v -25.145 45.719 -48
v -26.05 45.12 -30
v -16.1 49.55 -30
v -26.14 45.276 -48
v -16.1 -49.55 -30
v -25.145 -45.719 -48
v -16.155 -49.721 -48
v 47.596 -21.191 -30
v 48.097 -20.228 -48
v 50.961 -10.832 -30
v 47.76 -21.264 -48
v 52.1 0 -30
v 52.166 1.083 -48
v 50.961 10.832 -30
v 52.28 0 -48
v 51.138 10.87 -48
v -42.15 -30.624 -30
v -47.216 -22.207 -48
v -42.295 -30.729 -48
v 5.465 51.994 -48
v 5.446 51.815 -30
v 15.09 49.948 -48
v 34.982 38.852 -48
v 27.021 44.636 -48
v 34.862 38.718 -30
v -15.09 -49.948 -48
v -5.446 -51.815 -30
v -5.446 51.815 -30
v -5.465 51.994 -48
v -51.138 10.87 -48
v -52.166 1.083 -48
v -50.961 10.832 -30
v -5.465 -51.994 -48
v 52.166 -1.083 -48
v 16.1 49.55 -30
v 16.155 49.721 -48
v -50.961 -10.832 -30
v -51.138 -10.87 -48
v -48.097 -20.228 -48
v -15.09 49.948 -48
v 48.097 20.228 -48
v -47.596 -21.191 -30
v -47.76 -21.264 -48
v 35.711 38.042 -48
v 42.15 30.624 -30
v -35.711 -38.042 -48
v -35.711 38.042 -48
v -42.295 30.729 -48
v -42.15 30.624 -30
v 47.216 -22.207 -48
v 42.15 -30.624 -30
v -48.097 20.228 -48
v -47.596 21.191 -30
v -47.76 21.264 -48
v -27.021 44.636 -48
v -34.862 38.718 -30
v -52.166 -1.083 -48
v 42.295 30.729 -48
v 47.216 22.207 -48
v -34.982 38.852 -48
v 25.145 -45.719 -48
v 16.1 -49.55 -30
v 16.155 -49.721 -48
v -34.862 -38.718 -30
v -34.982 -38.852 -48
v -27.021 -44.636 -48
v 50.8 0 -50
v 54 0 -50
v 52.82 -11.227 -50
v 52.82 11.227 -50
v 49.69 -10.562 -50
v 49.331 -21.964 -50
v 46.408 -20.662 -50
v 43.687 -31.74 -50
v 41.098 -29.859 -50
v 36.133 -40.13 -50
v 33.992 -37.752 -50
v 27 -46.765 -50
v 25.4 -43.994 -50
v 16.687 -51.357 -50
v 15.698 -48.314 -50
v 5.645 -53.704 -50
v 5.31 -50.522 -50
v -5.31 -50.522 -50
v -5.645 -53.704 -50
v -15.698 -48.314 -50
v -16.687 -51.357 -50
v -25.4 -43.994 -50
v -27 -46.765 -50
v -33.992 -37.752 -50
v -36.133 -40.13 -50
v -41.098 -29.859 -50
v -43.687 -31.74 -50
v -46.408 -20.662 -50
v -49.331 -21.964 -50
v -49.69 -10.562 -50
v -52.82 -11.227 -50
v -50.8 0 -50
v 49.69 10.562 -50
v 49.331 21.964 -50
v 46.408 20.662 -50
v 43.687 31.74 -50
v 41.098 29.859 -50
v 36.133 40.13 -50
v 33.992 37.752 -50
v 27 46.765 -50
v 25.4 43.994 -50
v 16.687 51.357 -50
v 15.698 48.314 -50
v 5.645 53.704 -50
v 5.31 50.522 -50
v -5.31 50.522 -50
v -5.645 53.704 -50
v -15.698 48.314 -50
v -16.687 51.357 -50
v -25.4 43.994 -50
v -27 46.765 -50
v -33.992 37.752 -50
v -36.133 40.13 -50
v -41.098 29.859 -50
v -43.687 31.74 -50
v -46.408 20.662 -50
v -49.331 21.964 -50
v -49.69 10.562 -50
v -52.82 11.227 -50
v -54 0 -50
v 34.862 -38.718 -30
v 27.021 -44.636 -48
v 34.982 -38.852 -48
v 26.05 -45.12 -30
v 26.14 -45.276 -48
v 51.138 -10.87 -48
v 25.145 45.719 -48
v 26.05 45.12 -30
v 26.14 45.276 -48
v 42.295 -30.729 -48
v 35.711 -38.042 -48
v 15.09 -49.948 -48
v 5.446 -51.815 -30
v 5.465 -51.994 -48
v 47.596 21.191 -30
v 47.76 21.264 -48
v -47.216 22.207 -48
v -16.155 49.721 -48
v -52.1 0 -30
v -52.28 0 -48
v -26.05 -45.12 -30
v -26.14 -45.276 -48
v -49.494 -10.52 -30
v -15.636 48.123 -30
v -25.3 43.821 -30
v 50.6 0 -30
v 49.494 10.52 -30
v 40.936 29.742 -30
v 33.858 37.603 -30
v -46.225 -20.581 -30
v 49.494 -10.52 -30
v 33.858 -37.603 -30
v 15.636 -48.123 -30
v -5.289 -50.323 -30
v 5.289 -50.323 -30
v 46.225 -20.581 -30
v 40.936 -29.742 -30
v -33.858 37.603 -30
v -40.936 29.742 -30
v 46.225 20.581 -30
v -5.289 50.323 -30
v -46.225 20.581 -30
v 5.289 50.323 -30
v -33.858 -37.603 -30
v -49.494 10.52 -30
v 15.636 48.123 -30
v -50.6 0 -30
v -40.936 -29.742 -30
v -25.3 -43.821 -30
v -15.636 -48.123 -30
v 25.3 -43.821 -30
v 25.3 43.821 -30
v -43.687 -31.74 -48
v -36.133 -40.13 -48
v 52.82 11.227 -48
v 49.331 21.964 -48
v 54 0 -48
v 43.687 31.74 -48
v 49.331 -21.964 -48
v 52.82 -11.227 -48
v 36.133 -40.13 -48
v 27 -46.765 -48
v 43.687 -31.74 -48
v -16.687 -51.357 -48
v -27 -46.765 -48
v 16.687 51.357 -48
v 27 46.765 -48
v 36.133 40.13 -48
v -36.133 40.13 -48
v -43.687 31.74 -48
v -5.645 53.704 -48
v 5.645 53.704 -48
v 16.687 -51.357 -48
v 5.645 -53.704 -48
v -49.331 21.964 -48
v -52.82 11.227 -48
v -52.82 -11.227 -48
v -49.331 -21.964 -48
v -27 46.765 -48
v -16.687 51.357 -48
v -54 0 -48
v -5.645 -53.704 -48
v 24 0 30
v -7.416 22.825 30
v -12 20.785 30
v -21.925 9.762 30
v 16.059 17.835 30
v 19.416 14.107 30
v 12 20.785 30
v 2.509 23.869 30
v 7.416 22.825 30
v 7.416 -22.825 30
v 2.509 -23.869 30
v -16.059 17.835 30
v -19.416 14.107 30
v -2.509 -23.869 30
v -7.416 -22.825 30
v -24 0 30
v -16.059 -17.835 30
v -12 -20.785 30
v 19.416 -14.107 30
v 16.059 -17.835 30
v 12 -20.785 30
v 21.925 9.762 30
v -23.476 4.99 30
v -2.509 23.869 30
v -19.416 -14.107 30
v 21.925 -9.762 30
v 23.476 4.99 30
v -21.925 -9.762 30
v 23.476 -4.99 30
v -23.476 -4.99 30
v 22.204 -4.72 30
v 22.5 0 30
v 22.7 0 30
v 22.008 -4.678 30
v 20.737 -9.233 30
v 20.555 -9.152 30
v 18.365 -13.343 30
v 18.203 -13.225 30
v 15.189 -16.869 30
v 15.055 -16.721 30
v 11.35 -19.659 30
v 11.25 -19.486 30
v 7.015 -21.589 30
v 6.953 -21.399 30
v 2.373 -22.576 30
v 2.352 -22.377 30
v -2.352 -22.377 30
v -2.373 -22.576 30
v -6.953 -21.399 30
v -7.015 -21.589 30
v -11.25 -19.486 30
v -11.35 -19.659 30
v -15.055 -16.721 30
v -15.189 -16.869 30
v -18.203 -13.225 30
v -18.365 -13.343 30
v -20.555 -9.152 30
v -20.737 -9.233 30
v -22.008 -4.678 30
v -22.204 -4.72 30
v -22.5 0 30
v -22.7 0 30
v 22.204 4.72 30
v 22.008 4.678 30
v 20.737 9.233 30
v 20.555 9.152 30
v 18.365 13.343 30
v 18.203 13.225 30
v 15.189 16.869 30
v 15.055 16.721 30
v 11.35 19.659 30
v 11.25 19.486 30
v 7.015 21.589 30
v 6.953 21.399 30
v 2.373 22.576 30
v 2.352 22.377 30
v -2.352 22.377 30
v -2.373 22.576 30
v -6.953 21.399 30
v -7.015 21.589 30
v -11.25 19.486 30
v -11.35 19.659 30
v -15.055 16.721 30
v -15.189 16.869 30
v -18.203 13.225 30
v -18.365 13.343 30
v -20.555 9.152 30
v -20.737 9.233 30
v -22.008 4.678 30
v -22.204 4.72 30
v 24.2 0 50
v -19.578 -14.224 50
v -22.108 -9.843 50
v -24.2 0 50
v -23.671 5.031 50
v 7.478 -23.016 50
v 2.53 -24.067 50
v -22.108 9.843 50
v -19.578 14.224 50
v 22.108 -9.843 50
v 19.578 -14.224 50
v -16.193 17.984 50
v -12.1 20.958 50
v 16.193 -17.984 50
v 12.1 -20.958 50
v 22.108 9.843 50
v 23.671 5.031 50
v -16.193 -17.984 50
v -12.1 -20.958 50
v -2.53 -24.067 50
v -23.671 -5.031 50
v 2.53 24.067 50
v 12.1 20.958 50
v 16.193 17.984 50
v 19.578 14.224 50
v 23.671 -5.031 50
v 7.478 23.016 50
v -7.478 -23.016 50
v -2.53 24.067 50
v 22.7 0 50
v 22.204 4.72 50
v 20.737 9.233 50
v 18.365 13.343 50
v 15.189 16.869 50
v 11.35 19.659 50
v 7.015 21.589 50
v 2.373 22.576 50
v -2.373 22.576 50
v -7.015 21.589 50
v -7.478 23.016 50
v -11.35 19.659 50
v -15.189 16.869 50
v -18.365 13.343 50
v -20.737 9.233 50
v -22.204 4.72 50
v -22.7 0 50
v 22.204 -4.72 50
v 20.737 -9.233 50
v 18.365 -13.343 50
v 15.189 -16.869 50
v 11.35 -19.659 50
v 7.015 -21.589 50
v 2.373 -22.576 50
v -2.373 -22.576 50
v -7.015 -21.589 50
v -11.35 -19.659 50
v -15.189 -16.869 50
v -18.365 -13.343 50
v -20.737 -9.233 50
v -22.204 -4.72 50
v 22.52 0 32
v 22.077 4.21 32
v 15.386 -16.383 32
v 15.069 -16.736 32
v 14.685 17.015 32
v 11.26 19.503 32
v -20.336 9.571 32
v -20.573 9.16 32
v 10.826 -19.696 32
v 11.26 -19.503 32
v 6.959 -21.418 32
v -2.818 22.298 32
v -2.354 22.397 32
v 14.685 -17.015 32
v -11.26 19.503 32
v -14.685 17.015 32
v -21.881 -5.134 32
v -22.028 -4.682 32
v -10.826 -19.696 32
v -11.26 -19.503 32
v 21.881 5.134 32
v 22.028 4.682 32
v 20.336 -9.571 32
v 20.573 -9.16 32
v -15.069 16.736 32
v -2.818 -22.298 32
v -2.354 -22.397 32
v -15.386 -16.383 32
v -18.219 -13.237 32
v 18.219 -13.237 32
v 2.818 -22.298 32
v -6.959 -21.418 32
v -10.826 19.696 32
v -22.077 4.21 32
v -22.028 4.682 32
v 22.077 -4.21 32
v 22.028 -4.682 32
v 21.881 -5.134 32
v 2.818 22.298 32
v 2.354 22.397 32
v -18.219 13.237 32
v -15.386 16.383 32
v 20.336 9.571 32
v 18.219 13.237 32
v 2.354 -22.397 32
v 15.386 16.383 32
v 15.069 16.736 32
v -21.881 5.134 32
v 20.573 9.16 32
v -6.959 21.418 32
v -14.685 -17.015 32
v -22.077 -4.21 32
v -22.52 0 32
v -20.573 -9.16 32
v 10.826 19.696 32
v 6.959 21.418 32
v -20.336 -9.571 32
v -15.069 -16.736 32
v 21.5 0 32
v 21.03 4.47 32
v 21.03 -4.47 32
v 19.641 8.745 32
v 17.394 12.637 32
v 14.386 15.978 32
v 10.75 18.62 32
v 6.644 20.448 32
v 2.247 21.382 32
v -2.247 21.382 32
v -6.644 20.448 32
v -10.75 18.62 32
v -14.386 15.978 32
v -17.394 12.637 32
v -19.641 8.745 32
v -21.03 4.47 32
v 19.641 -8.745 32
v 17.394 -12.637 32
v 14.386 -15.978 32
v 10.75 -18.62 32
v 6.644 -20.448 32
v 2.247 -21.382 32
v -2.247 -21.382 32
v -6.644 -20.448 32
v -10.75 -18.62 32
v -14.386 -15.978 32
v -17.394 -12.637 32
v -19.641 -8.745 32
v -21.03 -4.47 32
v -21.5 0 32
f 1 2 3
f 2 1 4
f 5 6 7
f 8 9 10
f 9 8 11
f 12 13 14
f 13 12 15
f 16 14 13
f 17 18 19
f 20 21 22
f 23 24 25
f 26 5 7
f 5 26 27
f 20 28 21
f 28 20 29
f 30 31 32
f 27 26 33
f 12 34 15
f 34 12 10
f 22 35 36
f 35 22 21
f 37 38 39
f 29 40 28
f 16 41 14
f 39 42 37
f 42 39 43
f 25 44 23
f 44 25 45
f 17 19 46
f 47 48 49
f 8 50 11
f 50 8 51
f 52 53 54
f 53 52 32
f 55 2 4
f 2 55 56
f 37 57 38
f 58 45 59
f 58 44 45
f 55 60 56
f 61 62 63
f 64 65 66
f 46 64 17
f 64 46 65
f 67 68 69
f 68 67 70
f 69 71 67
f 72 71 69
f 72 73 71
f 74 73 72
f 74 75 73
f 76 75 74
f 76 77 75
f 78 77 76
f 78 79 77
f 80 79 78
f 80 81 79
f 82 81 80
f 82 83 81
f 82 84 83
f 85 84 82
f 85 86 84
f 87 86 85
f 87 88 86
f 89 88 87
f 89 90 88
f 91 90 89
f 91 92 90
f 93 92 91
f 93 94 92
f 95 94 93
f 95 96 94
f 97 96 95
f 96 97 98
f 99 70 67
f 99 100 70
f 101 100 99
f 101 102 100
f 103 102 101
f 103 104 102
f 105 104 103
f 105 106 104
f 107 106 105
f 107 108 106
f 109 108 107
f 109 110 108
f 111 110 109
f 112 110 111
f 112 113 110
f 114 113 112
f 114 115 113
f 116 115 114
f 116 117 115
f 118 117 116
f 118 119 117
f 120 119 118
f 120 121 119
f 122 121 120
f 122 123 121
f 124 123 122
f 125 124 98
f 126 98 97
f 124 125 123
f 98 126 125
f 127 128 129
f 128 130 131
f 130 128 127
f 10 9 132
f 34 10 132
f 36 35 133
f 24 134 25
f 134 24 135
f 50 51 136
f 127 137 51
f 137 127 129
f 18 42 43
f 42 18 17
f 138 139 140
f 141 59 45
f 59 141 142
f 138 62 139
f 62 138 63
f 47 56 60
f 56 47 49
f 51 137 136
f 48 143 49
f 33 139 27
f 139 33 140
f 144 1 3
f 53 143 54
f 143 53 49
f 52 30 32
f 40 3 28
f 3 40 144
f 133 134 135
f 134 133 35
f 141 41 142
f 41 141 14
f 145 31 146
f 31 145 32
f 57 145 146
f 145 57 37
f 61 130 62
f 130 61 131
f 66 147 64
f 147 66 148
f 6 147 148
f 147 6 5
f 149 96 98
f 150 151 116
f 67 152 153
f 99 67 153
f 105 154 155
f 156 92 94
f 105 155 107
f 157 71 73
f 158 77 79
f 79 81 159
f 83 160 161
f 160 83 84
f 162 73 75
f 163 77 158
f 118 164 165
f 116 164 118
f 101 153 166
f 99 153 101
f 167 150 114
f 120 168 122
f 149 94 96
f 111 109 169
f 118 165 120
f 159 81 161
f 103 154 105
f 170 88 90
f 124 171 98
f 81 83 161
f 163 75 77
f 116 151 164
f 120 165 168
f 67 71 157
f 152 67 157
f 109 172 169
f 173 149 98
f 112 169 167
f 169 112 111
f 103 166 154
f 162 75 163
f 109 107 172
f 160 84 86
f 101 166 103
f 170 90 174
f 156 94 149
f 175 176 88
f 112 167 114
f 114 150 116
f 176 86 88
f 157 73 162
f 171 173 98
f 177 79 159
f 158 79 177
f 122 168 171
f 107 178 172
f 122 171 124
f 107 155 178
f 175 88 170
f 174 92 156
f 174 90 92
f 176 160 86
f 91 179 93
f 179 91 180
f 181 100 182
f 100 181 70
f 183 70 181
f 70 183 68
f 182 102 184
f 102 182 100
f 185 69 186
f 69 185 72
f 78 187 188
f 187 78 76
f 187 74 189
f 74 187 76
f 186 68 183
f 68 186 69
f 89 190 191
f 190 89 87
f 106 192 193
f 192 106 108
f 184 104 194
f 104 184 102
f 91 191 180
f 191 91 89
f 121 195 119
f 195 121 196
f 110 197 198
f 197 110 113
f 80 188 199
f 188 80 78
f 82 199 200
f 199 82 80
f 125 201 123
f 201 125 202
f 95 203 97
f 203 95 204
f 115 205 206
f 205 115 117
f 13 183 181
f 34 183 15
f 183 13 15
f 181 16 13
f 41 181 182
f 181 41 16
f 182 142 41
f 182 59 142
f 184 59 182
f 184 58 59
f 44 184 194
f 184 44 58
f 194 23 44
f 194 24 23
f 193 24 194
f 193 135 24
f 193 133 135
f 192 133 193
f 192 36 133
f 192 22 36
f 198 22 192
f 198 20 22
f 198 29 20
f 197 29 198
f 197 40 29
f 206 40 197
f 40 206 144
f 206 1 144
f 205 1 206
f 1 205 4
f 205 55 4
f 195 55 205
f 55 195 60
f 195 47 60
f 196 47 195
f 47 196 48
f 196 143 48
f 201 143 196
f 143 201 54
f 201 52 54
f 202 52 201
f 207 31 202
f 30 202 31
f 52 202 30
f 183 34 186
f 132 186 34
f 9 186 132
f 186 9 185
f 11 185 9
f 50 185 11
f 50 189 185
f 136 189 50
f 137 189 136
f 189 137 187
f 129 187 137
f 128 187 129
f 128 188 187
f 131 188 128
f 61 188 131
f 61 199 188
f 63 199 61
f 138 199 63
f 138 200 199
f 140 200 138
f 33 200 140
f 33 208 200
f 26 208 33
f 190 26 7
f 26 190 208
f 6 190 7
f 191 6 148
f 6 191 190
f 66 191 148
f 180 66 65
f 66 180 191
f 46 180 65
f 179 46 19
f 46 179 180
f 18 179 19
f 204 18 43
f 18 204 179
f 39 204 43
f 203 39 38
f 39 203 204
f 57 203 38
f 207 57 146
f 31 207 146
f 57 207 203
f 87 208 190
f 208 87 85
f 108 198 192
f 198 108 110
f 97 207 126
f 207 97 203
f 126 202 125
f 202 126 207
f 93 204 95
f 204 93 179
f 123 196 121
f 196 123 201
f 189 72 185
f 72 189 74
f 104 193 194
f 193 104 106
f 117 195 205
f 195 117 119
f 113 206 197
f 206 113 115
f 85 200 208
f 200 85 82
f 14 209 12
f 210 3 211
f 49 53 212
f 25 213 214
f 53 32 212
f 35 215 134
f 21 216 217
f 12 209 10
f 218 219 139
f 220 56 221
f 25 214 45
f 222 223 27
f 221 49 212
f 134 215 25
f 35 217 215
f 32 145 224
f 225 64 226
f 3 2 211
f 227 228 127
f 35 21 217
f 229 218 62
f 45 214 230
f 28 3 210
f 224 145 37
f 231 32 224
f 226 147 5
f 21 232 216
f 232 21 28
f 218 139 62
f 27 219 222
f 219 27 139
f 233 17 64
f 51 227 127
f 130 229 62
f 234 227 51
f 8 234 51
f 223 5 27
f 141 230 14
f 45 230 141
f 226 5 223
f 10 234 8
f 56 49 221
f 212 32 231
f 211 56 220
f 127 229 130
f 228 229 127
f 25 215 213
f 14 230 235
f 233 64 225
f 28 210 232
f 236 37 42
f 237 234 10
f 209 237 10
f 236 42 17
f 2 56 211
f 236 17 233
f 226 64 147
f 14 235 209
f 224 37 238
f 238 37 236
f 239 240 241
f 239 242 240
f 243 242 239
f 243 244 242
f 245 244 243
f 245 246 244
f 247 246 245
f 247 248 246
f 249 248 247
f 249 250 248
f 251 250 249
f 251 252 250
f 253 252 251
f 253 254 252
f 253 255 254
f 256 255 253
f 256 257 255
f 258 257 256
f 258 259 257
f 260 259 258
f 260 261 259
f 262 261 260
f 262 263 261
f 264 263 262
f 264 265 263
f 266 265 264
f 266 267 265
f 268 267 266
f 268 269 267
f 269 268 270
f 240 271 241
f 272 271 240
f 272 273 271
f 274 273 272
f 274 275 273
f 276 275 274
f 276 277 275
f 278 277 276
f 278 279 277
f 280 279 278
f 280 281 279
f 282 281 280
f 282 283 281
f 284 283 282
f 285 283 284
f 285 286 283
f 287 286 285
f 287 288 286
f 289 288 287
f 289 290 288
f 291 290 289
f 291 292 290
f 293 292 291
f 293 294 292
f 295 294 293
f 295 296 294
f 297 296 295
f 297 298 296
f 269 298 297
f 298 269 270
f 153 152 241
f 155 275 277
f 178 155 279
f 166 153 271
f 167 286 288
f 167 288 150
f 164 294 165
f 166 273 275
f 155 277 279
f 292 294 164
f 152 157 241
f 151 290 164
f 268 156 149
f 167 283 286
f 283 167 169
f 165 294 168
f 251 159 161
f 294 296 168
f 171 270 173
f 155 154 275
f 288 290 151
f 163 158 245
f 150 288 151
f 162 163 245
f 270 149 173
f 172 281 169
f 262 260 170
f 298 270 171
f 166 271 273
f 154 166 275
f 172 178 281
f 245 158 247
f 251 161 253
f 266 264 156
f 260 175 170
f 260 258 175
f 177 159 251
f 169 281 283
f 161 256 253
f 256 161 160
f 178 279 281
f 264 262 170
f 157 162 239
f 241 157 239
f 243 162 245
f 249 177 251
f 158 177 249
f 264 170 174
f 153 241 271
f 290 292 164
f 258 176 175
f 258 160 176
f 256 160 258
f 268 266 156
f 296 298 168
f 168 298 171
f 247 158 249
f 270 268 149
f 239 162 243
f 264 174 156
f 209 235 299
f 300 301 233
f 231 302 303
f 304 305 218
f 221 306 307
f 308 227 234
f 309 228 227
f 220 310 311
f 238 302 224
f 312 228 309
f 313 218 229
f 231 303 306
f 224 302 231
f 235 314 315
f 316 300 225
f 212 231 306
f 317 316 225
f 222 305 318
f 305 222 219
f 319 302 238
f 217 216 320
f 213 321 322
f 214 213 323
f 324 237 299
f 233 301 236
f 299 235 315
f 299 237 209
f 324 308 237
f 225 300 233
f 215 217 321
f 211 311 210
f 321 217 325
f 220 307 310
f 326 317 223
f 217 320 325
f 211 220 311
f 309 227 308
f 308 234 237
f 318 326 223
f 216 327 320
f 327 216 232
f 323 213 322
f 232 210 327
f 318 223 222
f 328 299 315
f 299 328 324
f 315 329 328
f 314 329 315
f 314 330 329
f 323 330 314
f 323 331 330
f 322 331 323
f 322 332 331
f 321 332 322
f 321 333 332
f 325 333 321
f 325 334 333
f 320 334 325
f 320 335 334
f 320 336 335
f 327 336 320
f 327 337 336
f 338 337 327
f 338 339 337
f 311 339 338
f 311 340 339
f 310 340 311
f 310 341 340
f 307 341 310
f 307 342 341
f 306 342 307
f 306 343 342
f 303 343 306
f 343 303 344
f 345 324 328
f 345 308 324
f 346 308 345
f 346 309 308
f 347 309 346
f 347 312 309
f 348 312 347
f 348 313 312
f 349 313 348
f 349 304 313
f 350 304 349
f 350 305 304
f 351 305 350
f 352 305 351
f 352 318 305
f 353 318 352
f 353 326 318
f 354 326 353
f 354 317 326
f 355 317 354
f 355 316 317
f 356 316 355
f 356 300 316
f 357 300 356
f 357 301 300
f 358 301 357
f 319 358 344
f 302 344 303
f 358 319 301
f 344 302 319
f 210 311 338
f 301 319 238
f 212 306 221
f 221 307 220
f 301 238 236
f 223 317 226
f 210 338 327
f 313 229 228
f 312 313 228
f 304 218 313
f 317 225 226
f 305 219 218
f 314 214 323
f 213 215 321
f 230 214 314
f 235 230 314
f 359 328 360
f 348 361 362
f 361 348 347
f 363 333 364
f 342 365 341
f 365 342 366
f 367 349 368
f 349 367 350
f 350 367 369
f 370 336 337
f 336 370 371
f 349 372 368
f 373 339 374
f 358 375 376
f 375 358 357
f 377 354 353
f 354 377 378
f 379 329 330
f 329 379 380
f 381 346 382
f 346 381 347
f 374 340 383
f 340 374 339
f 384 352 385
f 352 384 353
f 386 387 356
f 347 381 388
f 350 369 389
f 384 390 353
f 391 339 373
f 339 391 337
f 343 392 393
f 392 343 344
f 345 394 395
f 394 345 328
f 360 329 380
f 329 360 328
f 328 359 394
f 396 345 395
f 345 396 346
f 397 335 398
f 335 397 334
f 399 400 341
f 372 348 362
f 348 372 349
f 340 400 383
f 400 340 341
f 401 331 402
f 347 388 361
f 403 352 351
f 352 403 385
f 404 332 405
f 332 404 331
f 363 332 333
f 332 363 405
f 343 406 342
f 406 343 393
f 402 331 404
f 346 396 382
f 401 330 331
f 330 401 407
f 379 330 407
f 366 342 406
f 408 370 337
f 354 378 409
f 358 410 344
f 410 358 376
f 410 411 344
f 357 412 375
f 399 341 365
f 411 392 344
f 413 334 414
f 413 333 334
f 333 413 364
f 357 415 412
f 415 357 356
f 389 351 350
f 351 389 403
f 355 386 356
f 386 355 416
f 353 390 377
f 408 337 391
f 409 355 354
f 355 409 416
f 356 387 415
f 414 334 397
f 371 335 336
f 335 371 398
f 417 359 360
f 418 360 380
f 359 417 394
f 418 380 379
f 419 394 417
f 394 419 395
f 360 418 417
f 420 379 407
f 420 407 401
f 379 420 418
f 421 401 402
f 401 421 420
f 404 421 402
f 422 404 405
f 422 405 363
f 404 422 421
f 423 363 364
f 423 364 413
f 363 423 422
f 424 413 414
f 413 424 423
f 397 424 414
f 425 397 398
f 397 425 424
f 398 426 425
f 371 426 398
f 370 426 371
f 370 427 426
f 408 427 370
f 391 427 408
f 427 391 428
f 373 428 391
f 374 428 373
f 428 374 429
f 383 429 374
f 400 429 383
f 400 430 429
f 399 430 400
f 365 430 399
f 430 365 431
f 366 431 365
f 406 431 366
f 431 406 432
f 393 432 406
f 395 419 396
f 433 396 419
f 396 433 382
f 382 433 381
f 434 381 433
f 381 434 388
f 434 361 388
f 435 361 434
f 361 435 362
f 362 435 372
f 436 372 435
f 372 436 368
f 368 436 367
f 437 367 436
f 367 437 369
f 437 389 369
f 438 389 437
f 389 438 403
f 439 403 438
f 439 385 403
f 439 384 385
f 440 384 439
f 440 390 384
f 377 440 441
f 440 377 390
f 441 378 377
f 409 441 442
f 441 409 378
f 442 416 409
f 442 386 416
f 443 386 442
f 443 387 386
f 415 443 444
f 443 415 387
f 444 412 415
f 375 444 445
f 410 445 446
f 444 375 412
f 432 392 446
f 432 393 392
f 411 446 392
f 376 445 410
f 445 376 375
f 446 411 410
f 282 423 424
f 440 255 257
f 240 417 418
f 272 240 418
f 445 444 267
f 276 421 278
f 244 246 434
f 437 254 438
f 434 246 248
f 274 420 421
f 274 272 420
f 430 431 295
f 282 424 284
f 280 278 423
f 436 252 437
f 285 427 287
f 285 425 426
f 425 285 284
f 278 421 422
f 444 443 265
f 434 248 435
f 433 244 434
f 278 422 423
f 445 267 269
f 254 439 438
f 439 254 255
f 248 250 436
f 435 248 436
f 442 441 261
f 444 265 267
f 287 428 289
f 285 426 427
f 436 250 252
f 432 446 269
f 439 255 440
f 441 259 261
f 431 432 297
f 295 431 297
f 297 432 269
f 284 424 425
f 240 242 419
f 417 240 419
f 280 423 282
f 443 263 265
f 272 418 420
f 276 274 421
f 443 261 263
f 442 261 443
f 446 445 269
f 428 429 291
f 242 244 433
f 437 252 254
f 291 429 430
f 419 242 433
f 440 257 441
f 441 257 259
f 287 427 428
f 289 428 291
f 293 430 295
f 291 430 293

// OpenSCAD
translate([0,0,-40]) {
    difference() {
        cylinder(h = 20, r1 = 52.3, r2 = 52.1, center = true);
        cylinder(h = 20, r1 = 50.8, r2 = 50.6, center = true);
    };
}

translate([0,0,-49]) {
    difference() {
        cylinder(h = 2, r1 = 54, r2 = 54, center = true);
        cylinder(h = 2, r1 = 51, r2 = 51, center = true);
    };
}

difference() {
    cylinder(h = 60, r1 = 52.1, r2 = 24.0, center = true);
    cylinder(h = 60, r1 = 50.6, r2 = 22.7, center = true);
};

translate([0,0,40]) {
    difference() {
        cylinder(h = 20, r1 = 24, r2 = 24.2, center = true);
        cylinder(h = 20, r1 = 22.5, r2 = 22.7, center = true);
    };
}
translate([0,0,31]) {
    difference() {
        cylinder(h = 2, r1 = 24, r2 = 24, center = true);
        cylinder(h = 2, r1 = 22.5, r2 = 21.5, center = true);
    };
}
